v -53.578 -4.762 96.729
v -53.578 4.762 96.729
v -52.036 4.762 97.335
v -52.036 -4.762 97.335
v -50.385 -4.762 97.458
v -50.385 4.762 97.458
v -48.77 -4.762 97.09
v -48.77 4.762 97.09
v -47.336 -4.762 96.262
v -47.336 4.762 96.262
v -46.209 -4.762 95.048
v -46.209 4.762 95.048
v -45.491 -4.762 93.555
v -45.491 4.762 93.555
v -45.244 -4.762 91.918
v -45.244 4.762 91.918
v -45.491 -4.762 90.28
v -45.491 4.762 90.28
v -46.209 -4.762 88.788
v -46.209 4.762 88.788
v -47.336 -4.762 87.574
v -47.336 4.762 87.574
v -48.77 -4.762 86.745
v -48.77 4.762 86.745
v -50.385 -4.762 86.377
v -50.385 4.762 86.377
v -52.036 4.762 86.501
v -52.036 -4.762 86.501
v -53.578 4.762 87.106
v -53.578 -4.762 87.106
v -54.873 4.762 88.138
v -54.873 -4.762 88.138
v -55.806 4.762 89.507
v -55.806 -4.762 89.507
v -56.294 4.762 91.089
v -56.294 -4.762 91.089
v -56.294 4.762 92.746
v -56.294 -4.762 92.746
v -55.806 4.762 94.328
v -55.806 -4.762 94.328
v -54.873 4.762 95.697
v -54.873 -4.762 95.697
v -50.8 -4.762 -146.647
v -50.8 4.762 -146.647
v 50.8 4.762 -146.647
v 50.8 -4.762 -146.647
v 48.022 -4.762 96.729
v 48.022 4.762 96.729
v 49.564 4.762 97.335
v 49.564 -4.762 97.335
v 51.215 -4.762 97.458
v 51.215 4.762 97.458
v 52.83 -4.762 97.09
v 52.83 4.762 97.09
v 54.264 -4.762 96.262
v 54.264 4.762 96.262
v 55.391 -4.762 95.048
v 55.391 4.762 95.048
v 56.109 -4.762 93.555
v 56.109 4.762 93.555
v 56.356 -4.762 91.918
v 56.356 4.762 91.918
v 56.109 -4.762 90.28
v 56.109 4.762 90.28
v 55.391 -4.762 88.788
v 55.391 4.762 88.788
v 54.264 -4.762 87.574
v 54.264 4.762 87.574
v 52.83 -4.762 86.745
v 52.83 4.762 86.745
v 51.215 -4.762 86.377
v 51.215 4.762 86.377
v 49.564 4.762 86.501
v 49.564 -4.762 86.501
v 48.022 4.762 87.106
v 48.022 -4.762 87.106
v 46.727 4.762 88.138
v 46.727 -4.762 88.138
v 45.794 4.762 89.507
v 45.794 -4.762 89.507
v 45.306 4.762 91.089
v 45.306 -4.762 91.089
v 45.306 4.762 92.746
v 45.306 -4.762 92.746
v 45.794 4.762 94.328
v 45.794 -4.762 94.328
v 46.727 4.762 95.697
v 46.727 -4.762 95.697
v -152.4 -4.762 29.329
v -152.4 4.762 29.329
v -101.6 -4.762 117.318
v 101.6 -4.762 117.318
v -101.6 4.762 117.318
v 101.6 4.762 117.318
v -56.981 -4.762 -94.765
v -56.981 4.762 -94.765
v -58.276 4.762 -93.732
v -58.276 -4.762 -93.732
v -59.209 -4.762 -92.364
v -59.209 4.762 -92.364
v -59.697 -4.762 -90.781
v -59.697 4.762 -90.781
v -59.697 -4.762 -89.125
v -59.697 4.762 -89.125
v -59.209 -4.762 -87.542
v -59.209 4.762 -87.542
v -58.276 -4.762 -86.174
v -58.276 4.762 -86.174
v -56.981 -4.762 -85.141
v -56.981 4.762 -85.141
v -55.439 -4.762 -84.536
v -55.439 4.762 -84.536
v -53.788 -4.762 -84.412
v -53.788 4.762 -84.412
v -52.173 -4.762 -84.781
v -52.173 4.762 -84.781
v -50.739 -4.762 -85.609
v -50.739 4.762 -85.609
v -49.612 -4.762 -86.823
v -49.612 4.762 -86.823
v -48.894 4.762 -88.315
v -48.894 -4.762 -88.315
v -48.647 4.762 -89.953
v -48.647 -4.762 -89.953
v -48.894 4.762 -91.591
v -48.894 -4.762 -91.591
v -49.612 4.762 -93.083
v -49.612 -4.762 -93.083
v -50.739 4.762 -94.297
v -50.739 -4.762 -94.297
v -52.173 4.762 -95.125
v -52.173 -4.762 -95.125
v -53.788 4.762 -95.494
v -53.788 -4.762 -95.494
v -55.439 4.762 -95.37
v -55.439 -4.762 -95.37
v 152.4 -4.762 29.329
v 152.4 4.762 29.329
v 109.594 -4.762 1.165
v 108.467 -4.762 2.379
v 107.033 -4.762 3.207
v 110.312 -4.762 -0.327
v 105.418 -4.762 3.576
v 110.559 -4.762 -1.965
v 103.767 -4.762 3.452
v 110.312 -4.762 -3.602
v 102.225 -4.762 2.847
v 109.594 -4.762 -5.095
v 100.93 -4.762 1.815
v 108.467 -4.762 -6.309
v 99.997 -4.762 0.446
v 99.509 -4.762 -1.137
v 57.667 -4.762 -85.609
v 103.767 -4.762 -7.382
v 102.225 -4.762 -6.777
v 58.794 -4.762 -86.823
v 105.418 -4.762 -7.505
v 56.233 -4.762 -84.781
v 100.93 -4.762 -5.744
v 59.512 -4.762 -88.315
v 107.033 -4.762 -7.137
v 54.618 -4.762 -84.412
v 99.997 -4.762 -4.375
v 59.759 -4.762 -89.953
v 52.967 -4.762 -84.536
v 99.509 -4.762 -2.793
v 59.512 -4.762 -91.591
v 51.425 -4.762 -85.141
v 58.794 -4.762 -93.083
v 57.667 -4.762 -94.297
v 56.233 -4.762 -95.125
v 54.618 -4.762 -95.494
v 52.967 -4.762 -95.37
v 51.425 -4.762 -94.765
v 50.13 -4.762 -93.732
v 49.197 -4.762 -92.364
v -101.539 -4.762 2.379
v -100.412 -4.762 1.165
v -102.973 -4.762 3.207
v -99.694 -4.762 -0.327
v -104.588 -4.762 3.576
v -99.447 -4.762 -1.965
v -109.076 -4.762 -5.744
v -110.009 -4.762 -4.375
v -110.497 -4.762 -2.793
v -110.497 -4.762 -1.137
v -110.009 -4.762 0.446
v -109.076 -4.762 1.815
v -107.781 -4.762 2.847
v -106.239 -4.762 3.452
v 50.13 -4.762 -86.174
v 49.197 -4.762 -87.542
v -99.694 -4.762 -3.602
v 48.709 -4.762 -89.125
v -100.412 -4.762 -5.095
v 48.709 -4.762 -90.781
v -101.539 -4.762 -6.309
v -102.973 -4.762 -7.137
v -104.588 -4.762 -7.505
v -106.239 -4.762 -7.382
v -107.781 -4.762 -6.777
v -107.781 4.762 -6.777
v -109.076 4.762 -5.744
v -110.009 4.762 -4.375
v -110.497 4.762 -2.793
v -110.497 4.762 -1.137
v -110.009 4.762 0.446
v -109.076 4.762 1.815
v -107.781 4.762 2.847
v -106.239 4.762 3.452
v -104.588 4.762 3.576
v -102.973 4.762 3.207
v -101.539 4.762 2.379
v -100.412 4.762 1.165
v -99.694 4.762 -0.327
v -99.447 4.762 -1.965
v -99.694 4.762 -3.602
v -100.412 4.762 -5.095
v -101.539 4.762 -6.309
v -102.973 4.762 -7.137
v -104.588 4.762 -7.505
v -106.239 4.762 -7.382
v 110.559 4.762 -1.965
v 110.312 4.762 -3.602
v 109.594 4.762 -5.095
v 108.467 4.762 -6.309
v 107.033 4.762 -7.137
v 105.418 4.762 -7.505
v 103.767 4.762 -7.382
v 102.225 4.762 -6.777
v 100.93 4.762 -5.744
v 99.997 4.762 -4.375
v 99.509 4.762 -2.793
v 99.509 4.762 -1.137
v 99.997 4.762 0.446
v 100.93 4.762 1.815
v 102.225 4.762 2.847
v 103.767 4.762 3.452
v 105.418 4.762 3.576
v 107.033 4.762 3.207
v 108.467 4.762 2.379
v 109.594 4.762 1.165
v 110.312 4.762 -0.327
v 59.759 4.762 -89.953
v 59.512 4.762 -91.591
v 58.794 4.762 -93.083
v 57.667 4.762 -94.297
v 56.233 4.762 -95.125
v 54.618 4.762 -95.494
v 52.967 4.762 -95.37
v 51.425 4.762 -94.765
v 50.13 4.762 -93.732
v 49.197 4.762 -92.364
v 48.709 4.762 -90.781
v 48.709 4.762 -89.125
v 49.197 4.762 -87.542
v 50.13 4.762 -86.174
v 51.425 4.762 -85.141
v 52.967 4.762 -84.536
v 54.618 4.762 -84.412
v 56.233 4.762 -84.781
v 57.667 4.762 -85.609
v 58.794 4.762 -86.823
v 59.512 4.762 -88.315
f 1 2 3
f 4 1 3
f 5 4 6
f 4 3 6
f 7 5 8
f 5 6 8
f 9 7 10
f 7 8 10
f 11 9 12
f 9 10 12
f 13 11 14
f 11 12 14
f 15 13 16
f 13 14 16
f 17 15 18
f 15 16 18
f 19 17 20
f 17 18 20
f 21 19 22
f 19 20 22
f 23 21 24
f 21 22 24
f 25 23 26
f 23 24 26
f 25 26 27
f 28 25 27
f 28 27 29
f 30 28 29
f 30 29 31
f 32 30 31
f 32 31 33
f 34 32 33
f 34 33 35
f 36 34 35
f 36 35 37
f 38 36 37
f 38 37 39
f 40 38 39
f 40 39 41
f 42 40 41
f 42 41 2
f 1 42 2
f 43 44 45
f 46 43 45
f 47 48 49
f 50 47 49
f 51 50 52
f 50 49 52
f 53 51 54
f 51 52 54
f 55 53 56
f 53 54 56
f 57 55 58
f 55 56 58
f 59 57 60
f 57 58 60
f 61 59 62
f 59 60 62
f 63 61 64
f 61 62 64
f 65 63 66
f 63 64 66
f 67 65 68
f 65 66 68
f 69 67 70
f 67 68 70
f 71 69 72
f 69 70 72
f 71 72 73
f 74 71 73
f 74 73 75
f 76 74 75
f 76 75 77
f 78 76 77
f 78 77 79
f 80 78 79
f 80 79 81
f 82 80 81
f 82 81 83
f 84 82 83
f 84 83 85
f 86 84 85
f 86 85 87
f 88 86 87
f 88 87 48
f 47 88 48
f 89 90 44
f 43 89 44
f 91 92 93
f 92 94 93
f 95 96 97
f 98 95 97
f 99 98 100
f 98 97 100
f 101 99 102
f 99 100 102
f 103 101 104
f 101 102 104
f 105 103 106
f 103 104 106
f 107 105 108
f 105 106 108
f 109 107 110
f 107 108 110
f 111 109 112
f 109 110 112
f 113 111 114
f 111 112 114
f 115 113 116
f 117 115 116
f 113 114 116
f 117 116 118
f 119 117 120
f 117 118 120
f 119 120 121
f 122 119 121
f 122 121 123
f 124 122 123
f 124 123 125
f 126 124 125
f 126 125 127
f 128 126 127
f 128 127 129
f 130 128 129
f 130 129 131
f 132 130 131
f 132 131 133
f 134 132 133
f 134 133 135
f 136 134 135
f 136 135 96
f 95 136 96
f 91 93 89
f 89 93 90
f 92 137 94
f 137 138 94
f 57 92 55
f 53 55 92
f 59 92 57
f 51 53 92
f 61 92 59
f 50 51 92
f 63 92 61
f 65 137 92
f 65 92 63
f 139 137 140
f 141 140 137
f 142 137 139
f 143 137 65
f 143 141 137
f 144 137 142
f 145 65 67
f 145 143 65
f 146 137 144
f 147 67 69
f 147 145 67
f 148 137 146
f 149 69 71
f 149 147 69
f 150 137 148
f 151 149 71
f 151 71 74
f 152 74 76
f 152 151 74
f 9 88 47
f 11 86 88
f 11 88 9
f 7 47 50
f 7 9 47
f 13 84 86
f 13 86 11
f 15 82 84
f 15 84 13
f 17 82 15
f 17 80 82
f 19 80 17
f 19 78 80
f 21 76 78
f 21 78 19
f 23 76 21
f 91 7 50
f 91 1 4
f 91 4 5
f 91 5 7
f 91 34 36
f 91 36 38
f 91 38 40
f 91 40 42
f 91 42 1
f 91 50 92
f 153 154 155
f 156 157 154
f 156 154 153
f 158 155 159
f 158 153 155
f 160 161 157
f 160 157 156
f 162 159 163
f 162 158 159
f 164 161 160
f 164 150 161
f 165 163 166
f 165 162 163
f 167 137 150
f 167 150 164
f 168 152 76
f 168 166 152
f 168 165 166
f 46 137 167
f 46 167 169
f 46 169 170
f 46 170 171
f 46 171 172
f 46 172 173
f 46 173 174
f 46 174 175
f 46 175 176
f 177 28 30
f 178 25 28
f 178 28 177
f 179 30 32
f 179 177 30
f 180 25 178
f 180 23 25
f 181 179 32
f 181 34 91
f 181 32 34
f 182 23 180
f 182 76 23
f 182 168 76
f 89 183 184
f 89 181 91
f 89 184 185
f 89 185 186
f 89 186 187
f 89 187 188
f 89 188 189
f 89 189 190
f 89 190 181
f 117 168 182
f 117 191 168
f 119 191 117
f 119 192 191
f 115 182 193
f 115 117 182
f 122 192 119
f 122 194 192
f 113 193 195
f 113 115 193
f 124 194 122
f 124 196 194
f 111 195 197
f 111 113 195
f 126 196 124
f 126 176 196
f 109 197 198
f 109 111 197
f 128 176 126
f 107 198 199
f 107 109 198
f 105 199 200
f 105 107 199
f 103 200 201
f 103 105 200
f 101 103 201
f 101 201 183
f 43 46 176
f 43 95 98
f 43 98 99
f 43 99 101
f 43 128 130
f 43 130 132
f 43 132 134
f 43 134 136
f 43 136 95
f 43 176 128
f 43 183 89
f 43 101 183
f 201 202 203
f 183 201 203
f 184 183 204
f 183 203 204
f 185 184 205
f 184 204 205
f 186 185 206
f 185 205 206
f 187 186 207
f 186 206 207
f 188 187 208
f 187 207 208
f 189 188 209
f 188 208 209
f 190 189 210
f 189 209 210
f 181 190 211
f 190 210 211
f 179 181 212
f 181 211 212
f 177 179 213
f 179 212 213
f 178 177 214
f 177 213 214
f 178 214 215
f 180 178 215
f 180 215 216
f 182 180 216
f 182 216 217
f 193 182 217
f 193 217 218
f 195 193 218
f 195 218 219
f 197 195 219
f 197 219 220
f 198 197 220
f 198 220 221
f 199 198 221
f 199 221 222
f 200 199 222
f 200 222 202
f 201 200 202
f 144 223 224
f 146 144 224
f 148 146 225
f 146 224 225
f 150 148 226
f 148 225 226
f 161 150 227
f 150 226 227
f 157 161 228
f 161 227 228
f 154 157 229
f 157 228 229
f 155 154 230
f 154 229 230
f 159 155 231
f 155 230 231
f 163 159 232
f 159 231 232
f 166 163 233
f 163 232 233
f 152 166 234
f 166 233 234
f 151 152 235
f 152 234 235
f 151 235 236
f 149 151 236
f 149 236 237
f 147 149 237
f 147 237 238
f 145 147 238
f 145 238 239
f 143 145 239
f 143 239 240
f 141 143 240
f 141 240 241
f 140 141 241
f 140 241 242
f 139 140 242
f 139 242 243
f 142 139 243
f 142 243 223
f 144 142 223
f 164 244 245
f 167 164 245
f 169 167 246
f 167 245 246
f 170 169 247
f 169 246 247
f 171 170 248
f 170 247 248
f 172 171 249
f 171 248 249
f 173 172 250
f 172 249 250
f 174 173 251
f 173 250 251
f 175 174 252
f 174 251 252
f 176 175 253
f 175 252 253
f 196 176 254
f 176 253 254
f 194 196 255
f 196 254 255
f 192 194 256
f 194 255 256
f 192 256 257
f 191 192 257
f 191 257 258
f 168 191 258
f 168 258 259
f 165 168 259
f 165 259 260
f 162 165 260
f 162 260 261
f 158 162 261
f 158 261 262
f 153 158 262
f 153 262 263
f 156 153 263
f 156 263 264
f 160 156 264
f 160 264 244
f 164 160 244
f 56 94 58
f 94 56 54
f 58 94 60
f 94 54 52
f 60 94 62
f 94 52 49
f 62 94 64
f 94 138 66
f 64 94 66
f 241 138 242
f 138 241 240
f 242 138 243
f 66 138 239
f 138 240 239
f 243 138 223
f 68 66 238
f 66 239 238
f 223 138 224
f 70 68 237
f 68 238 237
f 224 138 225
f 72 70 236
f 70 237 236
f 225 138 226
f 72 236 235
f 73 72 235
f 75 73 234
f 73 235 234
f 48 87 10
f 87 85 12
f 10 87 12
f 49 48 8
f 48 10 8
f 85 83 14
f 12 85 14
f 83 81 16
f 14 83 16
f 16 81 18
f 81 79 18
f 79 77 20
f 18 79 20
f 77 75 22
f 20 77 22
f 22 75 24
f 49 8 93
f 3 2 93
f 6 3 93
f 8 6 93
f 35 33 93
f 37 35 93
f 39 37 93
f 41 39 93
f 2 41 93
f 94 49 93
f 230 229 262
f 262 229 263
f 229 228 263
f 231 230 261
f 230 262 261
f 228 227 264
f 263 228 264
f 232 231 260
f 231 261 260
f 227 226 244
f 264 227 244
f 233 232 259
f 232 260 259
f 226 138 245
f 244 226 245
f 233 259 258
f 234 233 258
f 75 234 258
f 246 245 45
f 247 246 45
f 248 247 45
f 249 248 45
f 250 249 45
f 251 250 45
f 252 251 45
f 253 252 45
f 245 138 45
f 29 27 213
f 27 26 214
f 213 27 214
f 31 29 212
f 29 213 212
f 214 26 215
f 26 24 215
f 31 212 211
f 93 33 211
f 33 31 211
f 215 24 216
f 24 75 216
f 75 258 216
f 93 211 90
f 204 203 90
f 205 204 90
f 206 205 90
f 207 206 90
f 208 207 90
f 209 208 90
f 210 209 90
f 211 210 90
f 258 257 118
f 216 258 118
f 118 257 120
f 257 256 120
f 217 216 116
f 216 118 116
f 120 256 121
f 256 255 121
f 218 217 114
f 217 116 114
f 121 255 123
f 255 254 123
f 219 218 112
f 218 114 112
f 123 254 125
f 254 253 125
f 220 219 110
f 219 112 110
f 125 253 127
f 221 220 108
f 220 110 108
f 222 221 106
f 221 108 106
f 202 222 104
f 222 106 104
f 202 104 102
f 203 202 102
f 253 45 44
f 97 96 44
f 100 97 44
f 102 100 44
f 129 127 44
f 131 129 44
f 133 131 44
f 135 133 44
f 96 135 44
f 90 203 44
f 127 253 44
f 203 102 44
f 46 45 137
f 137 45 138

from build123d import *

# Parameters (mm, degrees)
BOSS_EXTRUDE1_DEPTH = 4.7625
SKETCH2_R           = 5.55625
CUT_EXTRUDE1_DEPTH  = 212.711641055
CIRPATTERN1_COUNT   = 3


with BuildPart() as part:
    # Sketch1 → Boss-Extrude1 (new, symmetric)
    with BuildSketch(Plane(origin=(0, 0, 0), x_dir=(1, 0, 0), z_dir=(0, 1, 0))):
        Polygon((-50.8, 146.646968374), (50.8, 146.646968374), (152.4, -29.329393675), (101.6, -117.317574699), (-101.6, -117.317574699), (-152.4, -29.329393675), align=None)
    extrude(amount=BOSS_EXTRUDE1_DEPTH, both=True)

    # Sketch2 → Cut-Extrude1 (cut, through all)
    with BuildSketch(Plane(origin=(0, 4.7625, 0), x_dir=(1, 0, 0), z_dir=(0, 1, 0))):
        with Locations((105.002954744, 1.964696837)):
            Circle(SKETCH2_R)
        with Locations((54.202954744, 89.952877862)):
            Circle(SKETCH2_R)
    cut_extrude1 = extrude(amount=-CUT_EXTRUDE1_DEPTH, mode=Mode.SUBTRACT)

    # CirPattern1: Cut-Extrude1 ×3 about axis
    cirpattern1_axis = Axis((0, 5.23875, 0), (0, -1, 0))
    for i in range(1, CIRPATTERN1_COUNT):
        add(cut_extrude1.rotate(cirpattern1_axis, i * 360 / CIRPATTERN1_COUNT), mode=Mode.SUBTRACT)


solid = part.part
